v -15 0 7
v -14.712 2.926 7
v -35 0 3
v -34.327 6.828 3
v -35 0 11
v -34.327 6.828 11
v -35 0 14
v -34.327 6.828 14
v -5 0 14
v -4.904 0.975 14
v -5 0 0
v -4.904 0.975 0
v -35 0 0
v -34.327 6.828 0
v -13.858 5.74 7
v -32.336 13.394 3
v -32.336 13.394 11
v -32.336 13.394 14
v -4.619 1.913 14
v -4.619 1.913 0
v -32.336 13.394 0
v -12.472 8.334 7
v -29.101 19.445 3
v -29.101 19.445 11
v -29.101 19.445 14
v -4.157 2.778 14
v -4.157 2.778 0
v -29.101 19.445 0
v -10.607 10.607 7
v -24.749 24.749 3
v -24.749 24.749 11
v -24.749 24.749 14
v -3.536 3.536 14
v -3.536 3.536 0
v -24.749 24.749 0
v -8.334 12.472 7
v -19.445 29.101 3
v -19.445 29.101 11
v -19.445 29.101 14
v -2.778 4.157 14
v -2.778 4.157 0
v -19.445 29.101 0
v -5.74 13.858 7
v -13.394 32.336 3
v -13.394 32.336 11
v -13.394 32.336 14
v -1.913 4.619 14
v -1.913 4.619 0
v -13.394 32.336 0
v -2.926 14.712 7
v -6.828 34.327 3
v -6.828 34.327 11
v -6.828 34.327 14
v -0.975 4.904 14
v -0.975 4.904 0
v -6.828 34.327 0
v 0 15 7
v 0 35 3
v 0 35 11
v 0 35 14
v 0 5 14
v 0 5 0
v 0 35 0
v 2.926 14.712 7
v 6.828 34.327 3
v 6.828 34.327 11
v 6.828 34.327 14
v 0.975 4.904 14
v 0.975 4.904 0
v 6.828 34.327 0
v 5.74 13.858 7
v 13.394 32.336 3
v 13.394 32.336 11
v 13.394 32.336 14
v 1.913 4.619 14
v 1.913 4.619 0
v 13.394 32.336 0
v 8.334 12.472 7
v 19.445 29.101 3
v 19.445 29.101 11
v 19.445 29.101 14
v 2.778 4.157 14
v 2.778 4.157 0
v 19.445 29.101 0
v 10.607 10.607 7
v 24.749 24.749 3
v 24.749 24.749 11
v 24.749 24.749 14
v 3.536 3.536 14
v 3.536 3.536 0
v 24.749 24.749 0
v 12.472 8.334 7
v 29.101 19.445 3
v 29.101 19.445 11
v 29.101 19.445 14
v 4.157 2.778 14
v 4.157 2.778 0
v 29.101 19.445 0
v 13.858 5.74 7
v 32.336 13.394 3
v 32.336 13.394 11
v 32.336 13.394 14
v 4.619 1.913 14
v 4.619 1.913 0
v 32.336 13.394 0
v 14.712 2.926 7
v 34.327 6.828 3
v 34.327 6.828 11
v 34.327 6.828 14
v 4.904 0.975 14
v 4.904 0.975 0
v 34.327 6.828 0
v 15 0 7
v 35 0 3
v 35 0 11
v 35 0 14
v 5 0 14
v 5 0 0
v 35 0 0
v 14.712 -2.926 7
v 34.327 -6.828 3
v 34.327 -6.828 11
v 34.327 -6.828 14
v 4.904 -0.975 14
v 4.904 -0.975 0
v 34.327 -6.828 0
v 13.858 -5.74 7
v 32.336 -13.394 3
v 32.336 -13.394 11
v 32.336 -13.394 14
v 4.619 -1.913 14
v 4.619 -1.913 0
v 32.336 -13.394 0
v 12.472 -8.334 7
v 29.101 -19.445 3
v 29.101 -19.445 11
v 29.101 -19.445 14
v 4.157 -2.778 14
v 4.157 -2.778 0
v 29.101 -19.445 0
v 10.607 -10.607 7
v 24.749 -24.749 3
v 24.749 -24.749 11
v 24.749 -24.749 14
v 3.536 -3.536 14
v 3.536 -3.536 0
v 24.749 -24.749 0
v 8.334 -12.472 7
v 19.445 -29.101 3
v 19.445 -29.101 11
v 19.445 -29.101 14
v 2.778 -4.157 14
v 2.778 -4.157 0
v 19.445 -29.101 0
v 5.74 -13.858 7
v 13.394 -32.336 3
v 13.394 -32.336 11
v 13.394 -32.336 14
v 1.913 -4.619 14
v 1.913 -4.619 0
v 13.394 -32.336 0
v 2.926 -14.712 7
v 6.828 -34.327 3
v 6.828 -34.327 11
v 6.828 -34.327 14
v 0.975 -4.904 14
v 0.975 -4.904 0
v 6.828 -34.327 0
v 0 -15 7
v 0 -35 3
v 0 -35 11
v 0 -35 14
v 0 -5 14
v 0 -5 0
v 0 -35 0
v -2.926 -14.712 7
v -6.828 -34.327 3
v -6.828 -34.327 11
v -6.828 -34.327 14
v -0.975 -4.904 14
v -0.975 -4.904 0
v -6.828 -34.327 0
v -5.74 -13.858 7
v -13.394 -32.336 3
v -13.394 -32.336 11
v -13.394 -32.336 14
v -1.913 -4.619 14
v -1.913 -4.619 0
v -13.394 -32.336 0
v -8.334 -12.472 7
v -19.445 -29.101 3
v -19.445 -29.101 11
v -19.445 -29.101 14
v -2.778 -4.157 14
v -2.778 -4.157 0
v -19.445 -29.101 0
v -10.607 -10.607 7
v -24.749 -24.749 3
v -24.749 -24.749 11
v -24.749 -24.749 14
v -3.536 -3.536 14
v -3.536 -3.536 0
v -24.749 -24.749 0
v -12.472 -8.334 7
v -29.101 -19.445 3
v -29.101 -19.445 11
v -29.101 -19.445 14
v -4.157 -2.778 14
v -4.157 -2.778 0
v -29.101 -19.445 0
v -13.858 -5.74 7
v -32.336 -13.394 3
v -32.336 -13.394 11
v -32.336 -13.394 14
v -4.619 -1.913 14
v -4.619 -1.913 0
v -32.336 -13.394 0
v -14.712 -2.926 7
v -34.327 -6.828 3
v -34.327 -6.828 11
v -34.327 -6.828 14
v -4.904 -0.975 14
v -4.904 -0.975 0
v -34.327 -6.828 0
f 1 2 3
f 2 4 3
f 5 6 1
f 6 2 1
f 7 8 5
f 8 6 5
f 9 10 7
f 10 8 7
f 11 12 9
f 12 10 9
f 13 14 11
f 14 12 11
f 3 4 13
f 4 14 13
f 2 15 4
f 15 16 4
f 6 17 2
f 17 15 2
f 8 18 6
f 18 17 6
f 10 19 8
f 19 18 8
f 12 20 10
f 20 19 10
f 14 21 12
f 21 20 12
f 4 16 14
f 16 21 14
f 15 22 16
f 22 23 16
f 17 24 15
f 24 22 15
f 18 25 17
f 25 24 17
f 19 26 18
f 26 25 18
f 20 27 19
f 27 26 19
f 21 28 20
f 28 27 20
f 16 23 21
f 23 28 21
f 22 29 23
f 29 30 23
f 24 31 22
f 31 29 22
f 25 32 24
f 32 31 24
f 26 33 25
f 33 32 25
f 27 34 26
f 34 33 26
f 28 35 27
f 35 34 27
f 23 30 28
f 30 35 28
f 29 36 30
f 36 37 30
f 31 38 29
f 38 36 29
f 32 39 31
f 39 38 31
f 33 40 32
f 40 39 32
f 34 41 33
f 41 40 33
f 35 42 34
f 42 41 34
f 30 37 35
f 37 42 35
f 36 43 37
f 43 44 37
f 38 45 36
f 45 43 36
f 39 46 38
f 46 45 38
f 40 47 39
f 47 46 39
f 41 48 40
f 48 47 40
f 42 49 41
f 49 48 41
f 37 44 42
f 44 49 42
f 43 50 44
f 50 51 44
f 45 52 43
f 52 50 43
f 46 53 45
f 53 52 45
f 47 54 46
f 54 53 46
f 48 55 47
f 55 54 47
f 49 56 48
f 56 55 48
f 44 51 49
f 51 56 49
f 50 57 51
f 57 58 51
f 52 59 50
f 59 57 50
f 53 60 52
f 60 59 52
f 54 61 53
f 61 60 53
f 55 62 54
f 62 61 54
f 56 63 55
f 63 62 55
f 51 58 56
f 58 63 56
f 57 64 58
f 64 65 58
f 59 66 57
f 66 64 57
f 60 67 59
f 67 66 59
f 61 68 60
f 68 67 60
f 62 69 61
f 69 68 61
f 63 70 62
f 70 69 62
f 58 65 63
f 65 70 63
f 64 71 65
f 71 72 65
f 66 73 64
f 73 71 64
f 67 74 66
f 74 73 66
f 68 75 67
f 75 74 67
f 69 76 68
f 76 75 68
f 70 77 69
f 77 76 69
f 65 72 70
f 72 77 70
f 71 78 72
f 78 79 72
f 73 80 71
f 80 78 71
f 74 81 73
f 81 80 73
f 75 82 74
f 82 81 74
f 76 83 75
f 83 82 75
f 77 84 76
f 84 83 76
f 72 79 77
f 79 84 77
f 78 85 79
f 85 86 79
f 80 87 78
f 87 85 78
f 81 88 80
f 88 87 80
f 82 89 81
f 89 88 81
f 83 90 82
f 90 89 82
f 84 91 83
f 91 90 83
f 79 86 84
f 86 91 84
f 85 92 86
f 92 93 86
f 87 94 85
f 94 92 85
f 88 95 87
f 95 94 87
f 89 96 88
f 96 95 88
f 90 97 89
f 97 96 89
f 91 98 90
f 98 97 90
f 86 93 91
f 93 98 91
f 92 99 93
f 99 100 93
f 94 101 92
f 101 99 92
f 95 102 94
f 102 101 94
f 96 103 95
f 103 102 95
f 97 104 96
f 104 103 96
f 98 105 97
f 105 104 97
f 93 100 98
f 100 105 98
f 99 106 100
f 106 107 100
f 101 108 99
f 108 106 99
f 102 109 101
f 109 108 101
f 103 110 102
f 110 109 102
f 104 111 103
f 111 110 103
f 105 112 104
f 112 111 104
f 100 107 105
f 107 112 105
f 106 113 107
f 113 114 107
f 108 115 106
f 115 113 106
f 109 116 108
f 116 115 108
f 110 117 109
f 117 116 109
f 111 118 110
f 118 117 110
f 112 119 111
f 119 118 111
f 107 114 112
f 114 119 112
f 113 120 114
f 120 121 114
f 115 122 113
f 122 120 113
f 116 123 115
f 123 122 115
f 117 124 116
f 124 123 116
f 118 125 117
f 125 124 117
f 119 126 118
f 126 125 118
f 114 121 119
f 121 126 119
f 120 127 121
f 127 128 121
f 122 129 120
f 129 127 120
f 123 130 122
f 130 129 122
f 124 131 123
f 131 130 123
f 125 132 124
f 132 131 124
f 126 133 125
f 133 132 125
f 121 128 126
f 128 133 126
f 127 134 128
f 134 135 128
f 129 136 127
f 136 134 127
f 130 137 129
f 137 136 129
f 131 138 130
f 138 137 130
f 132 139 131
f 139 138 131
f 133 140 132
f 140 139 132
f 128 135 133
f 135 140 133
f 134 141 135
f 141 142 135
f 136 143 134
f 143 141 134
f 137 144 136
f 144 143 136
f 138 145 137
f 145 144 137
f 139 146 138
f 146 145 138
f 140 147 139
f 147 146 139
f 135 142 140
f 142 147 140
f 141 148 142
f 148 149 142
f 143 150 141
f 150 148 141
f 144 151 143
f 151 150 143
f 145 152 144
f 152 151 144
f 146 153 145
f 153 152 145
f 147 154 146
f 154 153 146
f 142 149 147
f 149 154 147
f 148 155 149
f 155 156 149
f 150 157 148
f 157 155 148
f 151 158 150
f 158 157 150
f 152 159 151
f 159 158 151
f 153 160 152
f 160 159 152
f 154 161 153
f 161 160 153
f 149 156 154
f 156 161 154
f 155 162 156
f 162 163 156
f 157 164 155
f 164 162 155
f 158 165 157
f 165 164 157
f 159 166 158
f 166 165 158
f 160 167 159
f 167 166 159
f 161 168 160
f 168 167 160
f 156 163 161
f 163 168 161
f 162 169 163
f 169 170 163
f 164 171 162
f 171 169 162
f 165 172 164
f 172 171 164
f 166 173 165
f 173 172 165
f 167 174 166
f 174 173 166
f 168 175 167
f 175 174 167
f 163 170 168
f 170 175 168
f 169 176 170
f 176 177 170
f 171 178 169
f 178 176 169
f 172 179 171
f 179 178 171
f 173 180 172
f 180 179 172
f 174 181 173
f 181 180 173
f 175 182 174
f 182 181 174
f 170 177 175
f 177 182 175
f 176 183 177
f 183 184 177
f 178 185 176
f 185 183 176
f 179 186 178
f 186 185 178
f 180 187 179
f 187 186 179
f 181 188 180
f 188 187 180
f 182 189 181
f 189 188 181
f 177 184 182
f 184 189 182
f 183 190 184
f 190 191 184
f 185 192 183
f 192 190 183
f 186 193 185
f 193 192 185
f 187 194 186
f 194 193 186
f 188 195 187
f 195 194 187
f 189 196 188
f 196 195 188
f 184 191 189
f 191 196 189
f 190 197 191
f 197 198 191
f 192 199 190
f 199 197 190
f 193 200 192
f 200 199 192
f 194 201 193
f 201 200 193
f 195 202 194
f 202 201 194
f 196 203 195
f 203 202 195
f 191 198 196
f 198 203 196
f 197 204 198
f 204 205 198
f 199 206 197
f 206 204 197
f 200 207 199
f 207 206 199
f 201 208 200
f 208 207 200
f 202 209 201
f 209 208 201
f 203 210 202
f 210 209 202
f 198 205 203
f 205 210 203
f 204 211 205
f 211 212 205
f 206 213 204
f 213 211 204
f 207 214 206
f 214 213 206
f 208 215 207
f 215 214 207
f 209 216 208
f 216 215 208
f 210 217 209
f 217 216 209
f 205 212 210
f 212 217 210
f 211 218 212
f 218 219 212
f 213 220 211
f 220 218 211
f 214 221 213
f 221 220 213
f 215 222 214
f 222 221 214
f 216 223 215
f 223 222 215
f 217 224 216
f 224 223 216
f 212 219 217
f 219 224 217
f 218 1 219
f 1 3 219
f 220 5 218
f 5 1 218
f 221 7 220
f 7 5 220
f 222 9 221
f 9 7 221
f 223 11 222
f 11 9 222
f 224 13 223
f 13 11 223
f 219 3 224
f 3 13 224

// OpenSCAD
$fn = 32;

// ----------------------------------------------------------------------
// Revolved part: V-groove pulley R35
// ----------------------------------------------------------------------

// --- parameters (mm) ---
bore_r = 5;               // bore radius
rim_r = 35;               // rim radius
rim_t = 14;               // rim width
groove_r = 15;            // groove root radius
groove_w = 4;             // groove half width
revolve_angle = 360;      // revolve sweep, degrees

bore_d = 2 * bore_r;
rim_d = 2 * rim_r;
groove_d = 2 * groove_r;

profile = [[5, 0], [35, 0], [35, 3], [15, 7], [35, 11], [35, 14], [5, 14]];  // primary outline, 7 points, counter clockwise

// --- the one profile operation ---
rotate_extrude(angle = revolve_angle) polygon(points = profile);
